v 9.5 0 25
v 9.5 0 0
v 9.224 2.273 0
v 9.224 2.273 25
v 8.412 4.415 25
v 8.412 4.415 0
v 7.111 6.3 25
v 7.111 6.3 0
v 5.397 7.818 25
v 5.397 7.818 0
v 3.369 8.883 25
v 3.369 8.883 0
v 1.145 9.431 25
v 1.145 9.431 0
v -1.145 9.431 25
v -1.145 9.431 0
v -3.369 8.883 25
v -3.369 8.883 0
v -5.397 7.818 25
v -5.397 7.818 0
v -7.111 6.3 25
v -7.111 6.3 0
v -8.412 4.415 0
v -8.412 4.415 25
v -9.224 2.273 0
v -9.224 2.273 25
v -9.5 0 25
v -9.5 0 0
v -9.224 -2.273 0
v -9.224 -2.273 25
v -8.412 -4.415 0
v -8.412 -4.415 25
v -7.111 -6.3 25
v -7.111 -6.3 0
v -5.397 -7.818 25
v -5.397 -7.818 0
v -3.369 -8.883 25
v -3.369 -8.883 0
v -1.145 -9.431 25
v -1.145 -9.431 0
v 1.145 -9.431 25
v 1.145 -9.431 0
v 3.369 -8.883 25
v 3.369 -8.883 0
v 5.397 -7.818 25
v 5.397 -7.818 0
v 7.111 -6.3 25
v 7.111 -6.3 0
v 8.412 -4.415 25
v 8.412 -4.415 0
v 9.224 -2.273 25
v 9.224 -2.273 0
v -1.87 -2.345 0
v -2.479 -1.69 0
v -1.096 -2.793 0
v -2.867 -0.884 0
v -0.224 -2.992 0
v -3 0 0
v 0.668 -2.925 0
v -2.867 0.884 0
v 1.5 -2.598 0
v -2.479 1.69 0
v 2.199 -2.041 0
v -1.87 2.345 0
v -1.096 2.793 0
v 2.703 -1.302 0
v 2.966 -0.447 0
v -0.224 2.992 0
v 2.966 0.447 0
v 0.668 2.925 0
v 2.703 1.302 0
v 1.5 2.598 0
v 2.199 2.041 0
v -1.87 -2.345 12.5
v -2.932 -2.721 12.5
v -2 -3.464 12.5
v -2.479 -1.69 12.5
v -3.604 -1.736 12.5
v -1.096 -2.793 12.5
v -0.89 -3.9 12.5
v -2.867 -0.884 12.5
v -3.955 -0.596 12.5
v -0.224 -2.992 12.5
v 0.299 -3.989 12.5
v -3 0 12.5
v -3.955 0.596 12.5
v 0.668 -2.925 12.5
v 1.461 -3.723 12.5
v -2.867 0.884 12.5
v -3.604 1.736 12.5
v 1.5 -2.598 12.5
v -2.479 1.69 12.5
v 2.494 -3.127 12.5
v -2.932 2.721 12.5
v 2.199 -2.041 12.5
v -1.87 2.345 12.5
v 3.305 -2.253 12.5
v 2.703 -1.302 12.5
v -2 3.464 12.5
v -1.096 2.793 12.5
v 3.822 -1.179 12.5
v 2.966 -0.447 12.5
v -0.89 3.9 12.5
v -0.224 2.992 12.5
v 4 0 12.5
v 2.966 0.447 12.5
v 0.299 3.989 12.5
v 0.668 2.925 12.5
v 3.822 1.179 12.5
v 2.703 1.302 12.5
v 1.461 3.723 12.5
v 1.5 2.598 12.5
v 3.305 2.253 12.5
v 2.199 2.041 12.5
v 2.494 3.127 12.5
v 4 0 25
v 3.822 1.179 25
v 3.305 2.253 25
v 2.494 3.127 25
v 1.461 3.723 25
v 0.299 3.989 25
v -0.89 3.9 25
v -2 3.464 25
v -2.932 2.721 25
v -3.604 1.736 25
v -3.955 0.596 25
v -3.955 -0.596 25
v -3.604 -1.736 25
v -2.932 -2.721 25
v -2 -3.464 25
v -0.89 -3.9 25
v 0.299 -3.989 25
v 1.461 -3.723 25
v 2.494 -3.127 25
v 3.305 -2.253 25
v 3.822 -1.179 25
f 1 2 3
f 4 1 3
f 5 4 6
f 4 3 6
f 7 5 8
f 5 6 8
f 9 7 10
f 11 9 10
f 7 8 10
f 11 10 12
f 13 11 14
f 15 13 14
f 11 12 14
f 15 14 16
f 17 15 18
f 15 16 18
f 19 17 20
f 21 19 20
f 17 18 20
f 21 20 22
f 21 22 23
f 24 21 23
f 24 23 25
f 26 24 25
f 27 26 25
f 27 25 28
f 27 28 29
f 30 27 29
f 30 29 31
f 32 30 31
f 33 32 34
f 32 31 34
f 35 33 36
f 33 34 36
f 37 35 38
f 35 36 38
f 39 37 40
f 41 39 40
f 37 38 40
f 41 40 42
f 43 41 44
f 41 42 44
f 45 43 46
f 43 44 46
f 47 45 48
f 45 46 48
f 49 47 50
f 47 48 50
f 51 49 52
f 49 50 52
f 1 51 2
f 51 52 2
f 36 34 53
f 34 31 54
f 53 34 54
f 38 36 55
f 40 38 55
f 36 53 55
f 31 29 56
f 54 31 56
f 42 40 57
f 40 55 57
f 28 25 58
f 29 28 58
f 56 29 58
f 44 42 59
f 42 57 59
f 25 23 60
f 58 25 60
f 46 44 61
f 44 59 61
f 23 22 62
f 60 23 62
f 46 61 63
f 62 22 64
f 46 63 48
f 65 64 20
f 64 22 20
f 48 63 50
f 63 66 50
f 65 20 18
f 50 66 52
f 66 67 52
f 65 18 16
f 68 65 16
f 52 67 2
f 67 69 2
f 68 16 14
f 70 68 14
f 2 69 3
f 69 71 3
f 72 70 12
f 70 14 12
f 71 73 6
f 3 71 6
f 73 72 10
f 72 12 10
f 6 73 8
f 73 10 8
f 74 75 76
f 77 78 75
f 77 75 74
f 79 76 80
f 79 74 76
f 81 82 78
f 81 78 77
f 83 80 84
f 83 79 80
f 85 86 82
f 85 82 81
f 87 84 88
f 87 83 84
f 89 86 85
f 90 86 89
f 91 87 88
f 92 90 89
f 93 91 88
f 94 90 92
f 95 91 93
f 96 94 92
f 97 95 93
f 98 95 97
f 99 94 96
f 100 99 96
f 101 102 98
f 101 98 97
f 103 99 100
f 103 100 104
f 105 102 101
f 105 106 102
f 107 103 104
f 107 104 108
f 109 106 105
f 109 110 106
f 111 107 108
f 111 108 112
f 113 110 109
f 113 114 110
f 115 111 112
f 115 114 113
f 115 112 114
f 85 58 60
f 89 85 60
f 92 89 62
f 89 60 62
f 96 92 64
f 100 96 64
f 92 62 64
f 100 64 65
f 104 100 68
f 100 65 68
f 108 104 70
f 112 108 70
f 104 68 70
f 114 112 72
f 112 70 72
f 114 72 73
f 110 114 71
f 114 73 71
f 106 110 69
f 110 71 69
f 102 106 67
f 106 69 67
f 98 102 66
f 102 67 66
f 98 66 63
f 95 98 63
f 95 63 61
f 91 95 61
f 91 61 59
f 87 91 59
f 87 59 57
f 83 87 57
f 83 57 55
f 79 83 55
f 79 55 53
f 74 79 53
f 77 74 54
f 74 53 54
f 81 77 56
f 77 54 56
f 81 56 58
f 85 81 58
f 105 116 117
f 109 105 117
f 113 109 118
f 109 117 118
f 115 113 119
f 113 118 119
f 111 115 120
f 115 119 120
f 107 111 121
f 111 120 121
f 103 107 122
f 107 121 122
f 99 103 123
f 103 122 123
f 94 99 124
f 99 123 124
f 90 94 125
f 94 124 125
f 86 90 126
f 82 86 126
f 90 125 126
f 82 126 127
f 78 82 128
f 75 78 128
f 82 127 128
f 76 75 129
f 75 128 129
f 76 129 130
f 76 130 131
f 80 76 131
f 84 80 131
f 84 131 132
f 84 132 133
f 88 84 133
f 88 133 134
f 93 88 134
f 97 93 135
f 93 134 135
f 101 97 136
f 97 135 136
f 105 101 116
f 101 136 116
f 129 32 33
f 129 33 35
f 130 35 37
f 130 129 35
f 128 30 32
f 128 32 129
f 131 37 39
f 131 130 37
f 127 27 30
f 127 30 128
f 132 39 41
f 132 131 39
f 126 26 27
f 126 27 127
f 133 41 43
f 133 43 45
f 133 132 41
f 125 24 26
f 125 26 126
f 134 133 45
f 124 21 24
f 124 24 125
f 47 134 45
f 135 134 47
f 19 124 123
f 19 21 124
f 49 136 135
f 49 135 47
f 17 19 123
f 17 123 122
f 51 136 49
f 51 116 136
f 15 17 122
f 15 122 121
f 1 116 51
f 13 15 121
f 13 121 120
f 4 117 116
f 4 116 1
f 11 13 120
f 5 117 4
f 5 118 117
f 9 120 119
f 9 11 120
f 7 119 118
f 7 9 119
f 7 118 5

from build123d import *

# Parameters (mm, degrees)
SKETCH_1_R          = 9.5
EXTRUDE_1_DEPTH     = 25
SKETCH_2_R          = 4
CUT_EXTRUDE_1_DEPTH = 12.5
SKETCH_3_R          = 3
CUT_EXTRUDE_2_DEPTH = 12.5


with BuildPart() as part:
    # 草图1 → 凸台-拉伸1 (new body)
    with BuildSketch(Plane.XY):
        Circle(SKETCH_1_R)
    extrude(amount=EXTRUDE_1_DEPTH)

    # 草图2 → 切除-拉伸1 (cut)
    with BuildSketch(Plane.XY.offset(25)):
        Circle(SKETCH_2_R)
    extrude(amount=-CUT_EXTRUDE_1_DEPTH, mode=Mode.SUBTRACT)

    # 草图3 → 切除-拉伸2 (cut)
    with BuildSketch(Plane(origin=(0, 0, 0), x_dir=(-1, 0, 0), z_dir=(0, 0, -1))):
        Circle(SKETCH_3_R)
    extrude(amount=-CUT_EXTRUDE_2_DEPTH, mode=Mode.SUBTRACT)


solid = part.part
